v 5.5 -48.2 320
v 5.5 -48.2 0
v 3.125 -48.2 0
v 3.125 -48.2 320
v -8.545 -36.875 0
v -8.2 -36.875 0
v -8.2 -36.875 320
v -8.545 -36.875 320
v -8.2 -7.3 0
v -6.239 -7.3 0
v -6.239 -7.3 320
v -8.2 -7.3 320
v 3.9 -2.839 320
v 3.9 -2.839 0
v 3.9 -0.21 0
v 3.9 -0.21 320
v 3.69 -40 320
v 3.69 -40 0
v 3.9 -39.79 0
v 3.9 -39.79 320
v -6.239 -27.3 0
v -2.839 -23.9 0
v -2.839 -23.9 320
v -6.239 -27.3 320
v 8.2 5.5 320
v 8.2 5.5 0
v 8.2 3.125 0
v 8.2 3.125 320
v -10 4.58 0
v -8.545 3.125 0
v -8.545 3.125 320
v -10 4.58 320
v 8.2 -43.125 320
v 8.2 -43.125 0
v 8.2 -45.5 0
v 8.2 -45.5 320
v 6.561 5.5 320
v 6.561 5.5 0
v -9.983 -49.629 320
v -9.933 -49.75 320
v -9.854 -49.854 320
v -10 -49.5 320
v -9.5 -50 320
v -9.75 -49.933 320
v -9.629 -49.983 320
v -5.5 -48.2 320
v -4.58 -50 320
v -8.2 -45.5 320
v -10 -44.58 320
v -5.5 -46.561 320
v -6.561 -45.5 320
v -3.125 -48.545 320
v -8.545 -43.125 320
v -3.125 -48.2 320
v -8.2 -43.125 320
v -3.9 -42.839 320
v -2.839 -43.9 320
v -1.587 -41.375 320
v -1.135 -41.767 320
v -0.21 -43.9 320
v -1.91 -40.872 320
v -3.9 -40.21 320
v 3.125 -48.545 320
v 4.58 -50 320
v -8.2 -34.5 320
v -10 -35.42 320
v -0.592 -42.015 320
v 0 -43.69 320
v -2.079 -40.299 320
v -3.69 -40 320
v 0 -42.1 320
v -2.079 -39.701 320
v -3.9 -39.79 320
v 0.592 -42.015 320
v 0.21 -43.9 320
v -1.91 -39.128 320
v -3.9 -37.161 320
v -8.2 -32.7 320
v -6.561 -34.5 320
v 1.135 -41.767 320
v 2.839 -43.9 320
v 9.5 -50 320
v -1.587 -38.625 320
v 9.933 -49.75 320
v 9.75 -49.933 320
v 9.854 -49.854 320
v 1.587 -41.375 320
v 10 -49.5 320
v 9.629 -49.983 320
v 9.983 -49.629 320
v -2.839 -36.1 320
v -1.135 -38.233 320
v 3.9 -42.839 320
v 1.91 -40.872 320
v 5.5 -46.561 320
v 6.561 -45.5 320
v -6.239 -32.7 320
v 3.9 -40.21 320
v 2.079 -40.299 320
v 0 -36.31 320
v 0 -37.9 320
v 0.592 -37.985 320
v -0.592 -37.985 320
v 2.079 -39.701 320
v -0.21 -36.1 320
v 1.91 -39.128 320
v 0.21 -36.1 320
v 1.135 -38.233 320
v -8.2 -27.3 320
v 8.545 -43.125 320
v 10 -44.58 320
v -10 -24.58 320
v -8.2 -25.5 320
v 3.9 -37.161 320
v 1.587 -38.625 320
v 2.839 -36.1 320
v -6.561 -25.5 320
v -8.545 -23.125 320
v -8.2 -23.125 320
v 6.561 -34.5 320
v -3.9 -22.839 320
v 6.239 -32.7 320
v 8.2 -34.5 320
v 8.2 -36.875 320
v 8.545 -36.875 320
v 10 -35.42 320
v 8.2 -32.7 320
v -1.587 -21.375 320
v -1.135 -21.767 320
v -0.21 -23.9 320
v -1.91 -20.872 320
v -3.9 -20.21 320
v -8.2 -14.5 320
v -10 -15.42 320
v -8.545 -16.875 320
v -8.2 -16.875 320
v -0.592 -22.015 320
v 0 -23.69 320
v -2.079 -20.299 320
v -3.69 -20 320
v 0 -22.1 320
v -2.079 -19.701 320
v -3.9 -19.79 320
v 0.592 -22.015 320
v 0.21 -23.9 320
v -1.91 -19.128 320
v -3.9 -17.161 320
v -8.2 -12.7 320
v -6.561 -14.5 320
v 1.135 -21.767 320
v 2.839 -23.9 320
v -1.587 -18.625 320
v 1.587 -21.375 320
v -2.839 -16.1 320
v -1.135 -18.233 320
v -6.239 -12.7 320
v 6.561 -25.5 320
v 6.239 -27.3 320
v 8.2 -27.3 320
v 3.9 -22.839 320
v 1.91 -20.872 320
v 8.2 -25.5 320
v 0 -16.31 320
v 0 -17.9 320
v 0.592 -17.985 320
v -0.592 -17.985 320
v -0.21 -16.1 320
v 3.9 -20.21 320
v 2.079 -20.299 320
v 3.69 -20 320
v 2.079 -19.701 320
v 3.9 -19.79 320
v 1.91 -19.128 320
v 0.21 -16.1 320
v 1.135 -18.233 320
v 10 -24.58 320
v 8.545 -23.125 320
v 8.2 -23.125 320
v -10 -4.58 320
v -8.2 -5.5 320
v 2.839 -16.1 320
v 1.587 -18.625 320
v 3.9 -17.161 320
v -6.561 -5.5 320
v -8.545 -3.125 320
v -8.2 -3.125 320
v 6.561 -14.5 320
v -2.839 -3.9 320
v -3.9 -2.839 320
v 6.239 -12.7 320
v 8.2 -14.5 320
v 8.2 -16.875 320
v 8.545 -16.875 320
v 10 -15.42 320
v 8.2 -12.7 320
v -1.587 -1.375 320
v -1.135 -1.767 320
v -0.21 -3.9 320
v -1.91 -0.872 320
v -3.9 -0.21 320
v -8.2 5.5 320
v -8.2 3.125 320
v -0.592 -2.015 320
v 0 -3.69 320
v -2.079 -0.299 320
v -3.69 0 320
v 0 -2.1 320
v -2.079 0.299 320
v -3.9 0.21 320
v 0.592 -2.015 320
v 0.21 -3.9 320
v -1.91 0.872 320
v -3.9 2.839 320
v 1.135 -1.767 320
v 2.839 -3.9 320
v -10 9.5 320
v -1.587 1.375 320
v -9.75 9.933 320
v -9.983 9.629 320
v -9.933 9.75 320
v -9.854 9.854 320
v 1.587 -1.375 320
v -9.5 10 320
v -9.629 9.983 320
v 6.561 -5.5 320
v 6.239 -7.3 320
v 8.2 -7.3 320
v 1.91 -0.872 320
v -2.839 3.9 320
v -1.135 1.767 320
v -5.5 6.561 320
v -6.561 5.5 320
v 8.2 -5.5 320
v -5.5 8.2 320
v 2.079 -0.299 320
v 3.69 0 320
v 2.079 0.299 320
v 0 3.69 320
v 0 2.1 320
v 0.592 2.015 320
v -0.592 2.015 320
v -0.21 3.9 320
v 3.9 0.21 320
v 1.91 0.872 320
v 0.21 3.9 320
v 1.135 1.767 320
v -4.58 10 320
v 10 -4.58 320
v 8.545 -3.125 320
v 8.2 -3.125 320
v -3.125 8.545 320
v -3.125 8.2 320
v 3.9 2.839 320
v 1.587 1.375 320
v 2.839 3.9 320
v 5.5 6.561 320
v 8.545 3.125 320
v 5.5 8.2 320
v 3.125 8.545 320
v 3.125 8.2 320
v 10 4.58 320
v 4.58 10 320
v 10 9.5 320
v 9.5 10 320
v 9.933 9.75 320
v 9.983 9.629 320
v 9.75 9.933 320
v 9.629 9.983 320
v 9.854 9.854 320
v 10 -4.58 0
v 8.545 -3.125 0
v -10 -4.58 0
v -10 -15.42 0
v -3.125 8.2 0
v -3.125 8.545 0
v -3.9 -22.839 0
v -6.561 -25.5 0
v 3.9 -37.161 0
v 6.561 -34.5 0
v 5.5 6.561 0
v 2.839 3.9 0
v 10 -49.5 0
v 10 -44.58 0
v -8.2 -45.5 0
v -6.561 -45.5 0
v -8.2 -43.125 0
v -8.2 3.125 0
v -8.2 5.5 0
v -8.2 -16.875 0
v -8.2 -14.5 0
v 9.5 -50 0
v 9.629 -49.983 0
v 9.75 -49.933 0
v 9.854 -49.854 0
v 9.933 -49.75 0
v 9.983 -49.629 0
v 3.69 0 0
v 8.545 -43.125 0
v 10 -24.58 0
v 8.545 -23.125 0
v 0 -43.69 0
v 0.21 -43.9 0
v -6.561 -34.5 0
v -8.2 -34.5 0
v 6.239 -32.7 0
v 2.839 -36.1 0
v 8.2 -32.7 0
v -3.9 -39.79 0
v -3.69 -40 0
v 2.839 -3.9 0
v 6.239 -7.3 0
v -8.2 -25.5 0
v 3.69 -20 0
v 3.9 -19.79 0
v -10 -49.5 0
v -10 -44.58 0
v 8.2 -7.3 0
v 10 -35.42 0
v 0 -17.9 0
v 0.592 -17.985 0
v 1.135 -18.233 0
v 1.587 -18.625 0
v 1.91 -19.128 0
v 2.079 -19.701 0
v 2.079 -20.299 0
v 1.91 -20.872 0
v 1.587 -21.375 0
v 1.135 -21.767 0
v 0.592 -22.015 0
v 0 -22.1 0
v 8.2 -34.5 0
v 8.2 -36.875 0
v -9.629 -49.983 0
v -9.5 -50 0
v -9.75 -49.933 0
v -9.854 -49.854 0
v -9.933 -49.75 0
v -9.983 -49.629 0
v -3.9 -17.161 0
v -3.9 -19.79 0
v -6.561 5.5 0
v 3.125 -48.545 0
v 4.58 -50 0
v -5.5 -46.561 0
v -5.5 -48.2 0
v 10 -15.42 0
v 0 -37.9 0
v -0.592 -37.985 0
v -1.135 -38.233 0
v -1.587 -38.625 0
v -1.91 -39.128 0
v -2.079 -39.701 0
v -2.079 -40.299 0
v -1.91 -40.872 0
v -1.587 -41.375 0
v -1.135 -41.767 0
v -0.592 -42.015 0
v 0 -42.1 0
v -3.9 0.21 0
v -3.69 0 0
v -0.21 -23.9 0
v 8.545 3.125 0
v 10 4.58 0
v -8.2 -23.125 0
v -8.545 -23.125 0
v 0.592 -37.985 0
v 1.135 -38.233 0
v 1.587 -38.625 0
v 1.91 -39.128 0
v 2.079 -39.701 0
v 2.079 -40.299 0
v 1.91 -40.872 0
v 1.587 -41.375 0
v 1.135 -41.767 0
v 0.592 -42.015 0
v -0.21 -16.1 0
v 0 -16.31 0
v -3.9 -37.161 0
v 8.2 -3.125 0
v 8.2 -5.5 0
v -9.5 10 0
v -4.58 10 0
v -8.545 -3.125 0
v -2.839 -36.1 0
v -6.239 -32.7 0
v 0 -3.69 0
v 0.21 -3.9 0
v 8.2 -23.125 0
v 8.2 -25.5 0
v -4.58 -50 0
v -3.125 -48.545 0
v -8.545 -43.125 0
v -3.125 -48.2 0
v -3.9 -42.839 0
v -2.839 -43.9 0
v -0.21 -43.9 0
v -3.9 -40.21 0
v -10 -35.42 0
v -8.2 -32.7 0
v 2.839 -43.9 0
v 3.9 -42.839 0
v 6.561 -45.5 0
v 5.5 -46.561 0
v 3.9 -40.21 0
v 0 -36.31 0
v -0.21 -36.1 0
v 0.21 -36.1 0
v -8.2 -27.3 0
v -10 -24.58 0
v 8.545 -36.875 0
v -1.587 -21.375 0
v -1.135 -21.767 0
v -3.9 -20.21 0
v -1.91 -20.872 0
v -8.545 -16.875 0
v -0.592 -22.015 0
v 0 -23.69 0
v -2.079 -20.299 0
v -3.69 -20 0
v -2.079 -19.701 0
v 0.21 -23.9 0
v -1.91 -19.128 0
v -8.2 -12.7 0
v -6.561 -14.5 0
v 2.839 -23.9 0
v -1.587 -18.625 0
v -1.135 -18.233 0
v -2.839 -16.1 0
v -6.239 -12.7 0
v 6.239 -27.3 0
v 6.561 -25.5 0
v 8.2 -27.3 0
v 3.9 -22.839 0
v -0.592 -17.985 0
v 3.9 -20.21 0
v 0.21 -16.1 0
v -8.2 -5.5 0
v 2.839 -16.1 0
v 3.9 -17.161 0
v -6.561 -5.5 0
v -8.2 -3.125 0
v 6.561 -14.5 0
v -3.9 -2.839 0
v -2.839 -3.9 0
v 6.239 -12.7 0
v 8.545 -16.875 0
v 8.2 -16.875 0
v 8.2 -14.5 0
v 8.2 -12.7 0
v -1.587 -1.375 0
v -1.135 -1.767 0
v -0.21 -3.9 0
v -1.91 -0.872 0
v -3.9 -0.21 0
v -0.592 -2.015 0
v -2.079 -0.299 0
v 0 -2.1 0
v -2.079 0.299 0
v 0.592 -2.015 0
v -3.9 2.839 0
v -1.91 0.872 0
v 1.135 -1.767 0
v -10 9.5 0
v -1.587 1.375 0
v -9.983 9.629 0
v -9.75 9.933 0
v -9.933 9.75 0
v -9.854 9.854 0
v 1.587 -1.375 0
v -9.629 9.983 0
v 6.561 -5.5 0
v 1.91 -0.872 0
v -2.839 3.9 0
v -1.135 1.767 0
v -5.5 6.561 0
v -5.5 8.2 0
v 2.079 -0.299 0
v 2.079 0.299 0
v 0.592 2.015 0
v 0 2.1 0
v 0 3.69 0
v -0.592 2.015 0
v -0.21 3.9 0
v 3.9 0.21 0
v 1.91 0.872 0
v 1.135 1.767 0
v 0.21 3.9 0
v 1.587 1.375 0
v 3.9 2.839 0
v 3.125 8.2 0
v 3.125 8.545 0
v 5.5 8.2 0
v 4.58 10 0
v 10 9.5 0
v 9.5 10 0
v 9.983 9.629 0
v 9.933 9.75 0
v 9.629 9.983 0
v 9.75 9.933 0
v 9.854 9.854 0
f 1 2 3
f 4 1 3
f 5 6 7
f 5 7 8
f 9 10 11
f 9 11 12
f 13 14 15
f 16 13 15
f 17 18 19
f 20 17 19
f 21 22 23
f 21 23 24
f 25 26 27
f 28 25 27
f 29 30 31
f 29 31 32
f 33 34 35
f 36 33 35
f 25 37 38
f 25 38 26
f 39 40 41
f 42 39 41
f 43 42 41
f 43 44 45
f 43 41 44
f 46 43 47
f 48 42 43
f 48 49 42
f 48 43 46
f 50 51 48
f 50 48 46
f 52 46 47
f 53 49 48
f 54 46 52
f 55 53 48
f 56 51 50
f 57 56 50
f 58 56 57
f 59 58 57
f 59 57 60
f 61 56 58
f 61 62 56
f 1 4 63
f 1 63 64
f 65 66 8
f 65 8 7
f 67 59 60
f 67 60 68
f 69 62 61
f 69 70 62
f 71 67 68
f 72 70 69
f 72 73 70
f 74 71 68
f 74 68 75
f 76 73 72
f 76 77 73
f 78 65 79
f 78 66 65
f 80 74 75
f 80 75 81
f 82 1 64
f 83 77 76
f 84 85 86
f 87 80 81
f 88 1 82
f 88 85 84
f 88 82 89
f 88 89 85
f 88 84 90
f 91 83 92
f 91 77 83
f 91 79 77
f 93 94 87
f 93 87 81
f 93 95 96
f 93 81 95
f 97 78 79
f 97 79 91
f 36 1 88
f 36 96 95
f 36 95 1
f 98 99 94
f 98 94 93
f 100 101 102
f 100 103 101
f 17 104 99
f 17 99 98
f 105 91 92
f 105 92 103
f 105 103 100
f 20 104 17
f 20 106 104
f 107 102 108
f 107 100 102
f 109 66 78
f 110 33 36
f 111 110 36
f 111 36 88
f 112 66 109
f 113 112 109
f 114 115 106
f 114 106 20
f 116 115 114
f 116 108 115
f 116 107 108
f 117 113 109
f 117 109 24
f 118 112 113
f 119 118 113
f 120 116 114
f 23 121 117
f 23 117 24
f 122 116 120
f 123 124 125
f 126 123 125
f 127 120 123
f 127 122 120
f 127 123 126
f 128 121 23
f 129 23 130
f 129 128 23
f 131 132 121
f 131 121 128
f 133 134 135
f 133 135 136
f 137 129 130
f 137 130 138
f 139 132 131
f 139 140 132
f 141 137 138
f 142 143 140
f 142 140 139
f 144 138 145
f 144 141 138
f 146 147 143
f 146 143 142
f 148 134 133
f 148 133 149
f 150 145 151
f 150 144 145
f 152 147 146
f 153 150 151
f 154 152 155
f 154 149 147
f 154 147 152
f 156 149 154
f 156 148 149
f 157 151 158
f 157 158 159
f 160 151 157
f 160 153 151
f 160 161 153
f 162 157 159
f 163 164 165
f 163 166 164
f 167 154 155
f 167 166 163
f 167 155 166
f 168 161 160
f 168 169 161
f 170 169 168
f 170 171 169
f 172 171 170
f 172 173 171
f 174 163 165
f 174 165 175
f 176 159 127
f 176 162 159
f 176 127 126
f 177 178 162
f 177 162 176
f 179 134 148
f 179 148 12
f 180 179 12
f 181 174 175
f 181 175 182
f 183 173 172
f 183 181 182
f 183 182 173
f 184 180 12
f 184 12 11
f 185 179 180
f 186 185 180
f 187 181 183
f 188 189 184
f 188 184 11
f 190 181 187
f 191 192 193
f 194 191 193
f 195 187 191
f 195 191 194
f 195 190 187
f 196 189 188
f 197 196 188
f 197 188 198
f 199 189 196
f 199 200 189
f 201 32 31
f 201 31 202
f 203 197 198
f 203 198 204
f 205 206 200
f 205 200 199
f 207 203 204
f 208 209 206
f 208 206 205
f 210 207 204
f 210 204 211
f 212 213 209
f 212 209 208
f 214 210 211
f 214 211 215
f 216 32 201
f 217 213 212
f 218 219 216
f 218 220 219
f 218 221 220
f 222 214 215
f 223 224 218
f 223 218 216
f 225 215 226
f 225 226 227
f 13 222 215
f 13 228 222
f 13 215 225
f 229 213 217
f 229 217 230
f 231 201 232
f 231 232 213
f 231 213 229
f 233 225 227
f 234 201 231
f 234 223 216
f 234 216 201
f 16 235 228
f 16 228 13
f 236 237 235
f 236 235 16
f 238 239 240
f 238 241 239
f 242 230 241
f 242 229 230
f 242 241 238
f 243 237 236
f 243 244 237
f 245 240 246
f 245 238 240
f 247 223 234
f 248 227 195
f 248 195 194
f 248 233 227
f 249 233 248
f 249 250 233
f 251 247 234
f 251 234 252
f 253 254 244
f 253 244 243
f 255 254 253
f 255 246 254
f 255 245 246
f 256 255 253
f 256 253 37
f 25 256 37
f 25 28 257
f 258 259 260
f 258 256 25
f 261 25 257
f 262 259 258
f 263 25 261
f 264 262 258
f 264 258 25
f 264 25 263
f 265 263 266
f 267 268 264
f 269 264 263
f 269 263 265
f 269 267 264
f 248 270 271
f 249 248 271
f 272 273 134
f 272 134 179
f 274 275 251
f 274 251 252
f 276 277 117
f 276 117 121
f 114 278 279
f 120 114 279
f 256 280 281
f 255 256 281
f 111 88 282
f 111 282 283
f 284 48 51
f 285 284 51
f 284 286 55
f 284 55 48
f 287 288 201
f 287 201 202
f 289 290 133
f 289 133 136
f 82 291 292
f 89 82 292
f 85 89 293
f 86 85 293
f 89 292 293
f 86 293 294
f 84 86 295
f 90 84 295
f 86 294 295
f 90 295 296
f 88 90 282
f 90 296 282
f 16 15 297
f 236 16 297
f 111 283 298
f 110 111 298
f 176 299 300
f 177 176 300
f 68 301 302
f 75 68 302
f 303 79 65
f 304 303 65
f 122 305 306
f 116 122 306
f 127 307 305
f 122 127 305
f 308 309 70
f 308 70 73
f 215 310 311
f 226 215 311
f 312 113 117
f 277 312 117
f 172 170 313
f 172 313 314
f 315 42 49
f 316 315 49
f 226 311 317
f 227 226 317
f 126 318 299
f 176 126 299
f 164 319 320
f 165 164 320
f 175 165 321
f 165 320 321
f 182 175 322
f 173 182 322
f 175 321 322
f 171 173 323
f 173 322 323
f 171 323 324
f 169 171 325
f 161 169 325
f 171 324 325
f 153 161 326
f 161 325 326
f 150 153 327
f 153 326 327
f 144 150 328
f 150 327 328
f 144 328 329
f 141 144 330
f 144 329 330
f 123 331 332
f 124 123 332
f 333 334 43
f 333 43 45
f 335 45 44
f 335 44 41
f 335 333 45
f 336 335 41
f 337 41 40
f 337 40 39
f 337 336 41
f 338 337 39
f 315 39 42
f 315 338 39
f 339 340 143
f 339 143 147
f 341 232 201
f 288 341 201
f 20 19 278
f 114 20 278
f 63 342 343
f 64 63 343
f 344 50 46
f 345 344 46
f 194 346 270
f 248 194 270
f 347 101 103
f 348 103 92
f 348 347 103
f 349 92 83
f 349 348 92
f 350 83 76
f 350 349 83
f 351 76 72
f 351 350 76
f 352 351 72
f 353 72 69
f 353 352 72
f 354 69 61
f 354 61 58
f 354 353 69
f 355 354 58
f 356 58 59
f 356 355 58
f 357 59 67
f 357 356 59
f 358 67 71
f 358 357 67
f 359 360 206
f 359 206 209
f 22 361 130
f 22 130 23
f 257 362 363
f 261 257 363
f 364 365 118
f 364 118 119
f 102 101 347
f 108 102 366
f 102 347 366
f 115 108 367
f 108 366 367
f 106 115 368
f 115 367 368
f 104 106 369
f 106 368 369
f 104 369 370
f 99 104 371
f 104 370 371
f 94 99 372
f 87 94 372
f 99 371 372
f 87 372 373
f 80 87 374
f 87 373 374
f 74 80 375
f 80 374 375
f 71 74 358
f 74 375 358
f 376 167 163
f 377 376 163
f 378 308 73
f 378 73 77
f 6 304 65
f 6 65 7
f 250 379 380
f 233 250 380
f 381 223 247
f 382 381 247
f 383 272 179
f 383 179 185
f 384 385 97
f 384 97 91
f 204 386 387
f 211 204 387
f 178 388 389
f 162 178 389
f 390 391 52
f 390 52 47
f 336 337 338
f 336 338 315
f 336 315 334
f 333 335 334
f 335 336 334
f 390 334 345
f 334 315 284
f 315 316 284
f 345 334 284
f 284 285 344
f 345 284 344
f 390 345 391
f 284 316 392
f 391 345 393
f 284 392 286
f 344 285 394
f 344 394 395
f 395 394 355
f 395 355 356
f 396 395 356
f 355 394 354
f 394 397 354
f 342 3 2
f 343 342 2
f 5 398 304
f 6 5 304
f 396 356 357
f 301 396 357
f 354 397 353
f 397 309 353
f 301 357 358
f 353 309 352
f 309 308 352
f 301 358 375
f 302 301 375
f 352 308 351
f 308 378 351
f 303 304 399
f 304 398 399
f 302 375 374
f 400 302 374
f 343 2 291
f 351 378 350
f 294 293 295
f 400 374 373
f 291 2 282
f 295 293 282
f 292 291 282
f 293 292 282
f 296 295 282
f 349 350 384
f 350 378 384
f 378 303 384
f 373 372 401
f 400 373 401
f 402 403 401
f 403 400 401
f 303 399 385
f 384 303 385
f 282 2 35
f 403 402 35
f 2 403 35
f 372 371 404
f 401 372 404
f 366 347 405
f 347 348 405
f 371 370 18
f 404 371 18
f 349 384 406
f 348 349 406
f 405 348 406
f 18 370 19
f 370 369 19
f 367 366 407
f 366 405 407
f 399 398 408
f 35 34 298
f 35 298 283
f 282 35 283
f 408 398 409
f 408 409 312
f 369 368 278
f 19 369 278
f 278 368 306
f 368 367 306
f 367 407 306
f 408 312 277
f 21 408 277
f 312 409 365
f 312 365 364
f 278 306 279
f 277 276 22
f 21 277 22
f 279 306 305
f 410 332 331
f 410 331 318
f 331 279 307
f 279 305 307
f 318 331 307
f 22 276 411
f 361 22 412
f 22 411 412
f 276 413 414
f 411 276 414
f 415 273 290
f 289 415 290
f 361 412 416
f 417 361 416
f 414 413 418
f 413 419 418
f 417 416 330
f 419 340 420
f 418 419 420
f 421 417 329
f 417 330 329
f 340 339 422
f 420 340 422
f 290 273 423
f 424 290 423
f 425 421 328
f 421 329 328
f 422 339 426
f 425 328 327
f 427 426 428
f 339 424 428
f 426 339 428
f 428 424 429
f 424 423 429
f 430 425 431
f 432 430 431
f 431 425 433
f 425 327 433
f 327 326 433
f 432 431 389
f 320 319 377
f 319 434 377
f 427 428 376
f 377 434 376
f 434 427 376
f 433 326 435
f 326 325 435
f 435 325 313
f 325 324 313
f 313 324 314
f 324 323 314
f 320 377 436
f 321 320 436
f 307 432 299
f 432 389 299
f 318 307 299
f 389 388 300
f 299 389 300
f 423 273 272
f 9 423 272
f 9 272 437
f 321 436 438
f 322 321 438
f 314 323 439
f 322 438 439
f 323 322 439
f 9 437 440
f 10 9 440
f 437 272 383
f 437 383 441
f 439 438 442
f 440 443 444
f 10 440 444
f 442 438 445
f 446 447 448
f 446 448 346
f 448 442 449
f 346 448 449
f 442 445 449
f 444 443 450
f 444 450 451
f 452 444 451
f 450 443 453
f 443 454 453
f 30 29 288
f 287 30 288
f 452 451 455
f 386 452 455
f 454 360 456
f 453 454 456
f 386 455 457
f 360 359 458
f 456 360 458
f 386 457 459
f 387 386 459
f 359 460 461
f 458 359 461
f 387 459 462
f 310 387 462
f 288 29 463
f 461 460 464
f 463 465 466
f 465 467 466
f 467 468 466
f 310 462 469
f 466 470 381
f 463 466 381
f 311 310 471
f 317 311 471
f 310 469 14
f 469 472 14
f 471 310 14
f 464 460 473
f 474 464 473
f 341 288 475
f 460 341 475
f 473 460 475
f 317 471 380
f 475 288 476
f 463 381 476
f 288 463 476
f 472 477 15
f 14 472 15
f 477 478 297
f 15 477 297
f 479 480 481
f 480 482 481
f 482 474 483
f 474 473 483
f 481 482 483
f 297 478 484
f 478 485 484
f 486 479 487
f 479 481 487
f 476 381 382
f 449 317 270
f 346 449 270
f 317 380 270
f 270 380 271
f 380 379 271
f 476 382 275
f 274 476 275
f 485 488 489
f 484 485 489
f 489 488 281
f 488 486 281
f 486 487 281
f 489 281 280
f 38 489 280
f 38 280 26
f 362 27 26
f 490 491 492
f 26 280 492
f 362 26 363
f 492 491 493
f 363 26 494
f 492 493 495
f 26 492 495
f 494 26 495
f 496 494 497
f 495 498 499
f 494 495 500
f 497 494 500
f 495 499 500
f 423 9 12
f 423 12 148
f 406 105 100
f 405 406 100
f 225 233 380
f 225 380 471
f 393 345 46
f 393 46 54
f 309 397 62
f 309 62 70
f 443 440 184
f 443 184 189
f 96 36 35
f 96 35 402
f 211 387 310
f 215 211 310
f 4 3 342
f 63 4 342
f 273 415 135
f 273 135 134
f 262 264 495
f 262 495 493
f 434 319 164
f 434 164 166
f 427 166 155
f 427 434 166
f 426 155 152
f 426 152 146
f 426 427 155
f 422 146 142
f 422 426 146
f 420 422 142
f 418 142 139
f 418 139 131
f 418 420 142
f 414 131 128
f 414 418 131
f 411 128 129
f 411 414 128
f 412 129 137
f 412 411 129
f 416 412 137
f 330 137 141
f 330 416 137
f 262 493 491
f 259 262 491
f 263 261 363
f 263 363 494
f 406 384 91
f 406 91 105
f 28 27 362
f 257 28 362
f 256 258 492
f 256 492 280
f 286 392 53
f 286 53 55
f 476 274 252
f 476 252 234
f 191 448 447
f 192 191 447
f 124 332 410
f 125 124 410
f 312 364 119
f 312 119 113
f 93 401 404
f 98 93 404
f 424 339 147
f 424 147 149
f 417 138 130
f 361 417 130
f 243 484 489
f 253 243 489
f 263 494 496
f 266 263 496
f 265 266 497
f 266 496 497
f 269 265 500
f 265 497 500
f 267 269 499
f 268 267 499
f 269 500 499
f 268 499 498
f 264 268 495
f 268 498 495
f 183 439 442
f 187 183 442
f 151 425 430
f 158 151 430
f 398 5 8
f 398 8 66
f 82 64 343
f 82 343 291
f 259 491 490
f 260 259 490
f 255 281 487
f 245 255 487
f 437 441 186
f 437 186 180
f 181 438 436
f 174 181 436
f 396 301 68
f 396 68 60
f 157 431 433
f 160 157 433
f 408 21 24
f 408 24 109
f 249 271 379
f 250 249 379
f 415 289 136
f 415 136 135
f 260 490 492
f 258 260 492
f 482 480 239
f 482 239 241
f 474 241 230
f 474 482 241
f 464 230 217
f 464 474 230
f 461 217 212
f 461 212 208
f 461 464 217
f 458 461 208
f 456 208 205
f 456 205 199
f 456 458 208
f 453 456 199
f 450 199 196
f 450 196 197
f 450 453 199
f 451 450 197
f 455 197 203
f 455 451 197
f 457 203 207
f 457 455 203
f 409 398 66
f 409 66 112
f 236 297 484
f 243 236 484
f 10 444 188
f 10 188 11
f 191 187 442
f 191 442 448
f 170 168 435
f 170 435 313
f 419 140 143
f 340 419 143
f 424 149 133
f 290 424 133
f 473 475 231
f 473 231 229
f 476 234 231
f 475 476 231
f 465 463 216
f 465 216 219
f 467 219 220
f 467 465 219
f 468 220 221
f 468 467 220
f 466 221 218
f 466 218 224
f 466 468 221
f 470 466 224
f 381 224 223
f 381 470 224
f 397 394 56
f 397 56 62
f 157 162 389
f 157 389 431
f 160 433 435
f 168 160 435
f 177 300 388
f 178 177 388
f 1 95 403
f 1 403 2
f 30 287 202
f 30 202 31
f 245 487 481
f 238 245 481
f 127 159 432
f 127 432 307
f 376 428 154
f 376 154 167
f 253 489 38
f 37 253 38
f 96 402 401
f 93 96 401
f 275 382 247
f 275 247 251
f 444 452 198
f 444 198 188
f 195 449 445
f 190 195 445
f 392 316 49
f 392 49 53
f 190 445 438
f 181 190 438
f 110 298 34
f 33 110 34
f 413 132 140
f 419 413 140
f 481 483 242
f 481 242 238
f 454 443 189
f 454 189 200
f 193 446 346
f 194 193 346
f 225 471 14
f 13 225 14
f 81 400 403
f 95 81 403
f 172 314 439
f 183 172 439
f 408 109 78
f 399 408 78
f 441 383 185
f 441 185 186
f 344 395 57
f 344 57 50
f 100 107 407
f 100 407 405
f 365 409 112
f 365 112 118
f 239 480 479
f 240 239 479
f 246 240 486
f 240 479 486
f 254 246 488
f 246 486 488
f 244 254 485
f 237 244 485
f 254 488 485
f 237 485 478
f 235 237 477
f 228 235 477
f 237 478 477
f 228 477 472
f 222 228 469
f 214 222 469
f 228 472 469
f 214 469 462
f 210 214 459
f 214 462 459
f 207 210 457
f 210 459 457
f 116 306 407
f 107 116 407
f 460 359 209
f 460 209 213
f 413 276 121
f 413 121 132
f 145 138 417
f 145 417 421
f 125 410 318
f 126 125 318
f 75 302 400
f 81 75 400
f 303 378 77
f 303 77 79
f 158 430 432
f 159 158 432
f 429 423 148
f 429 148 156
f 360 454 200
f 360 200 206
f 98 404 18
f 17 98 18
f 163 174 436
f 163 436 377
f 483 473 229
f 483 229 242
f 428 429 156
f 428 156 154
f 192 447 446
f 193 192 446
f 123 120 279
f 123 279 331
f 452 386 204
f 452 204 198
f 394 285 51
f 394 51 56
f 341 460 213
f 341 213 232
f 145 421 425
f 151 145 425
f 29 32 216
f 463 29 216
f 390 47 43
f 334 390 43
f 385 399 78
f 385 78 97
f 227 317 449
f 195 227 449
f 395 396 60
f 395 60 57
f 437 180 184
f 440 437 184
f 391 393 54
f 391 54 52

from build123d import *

# Parameters (mm, degrees)
BOSS_EXTRU_1_DEPTH = 320


with BuildPart() as part:
    # Esquisse1 → Boss.-Extru.1 (new body)
    with BuildSketch(Plane.XY):
        with BuildLine():
            Line((-9.5, 10), (-4.58, 10))
            Line((-4.58, 10), (-3.125, 8.545))
            Line((-3.125, 8.545), (-3.125, 8.2))
            Line((-3.125, 8.2), (-5.5, 8.2))
            Line((-5.5, 8.2), (-5.5, 6.560660172))
            Line((-5.5, 6.560660172), (-2.839339828, 3.9))
            Line((-2.839339828, 3.9), (-0.21, 3.9))
            Line((-0.21, 3.9), (0, 3.69))
            Line((0, 3.69), (0, 2.1))
            ThreePointArc((0, 2.1), (-2.1, 0), (0, -2.1))
            Line((0, -2.1), (0, -3.69))
            Line((0, -3.69), (-0.21, -3.9))
            Line((-0.21, -3.9), (-2.839339828, -3.9))
            Line((-2.839339828, -3.9), (-6.239339828, -7.3))
            Line((-6.239339828, -7.3), (-8.2, -7.3))
            Line((-8.2, -7.3), (-8.2, -12.7))
            Line((-8.2, -12.7), (-6.239339828, -12.7))
            Line((-6.239339828, -12.7), (-2.839339828, -16.1))
            Line((-2.839339828, -16.1), (-0.21, -16.1))
            Line((-0.21, -16.1), (0, -16.31))
            Line((0, -16.31), (0, -17.9))
            ThreePointArc((0, -17.9), (-2.1, -20), (0, -22.1))
            Line((0, -22.1), (0, -23.69))
            Line((0, -23.69), (-0.21, -23.9))
            Line((-0.21, -23.9), (-2.839339828, -23.9))
            Line((-2.839339828, -23.9), (-6.239339828, -27.3))
            Line((-6.239339828, -27.3), (-8.2, -27.3))
            Line((-8.2, -27.3), (-8.2, -32.7))
            Line((-8.2, -32.7), (-6.239339828, -32.7))
            Line((-6.239339828, -32.7), (-2.839339828, -36.1))
            Line((-2.839339828, -36.1), (-0.21, -36.1))
            Line((-0.21, -36.1), (0, -36.31))
            Line((0, -36.31), (0, -37.9))
            ThreePointArc((0, -37.9), (-2.1, -40), (0, -42.1))
            Line((0, -42.1), (0, -43.69))
            Line((0, -43.69), (-0.21, -43.9))
            Line((-0.21, -43.9), (-2.839339828, -43.9))
            Line((-2.839339828, -43.9), (-5.5, -46.560660172))
            Line((-5.5, -46.560660172), (-5.5, -48.2))
            Line((-5.5, -48.2), (-3.125, -48.2))
            Line((-3.125, -48.2), (-3.125, -48.545))
            Line((-3.125, -48.545), (-4.58, -50))
            Line((-4.58, -50), (-9.5, -50))
            ThreePointArc((-9.5, -50), (-9.853553391, -49.853553391), (-10, -49.5))
            Line((-10, -49.5), (-10, -44.58))
            Line((-10, -44.58), (-8.545, -43.125))
            Line((-8.545, -43.125), (-8.2, -43.125))
            Line((-8.2, -43.125), (-8.2, -45.5))
            Line((-8.2, -45.5), (-6.560660172, -45.5))
            Line((-6.560660172, -45.5), (-3.9, -42.839339828))
            Line((-3.9, -42.839339828), (-3.9, -40.21))
            Line((-3.9, -40.21), (-3.69, -40))
            Line((-3.69, -40), (-3.9, -39.79))
            Line((-3.9, -39.79), (-3.9, -37.160660172))
            Line((-3.9, -37.160660172), (-6.560660172, -34.5))
            Line((-6.560660172, -34.5), (-8.2, -34.5))
            Line((-8.2, -34.5), (-8.2, -36.875))
            Line((-8.2, -36.875), (-8.545, -36.875))
            Line((-8.545, -36.875), (-10, -35.42))
            Line((-10, -35.42), (-10, -24.58))
            Line((-10, -24.58), (-8.545, -23.125))
            Line((-8.545, -23.125), (-8.2, -23.125))
            Line((-8.2, -23.125), (-8.2, -25.5))
            Line((-8.2, -25.5), (-6.560660172, -25.5))
            Line((-6.560660172, -25.5), (-3.9, -22.839339828))
            Line((-3.9, -22.839339828), (-3.9, -20.21))
            Line((-3.9, -20.21), (-3.69, -20))
            Line((-3.69, -20), (-3.9, -19.79))
            Line((-3.9, -19.79), (-3.9, -17.160660172))
            Line((-3.9, -17.160660172), (-6.560660172, -14.5))
            Line((-6.560660172, -14.5), (-8.2, -14.5))
            Line((-8.2, -14.5), (-8.2, -16.875))
            Line((-8.2, -16.875), (-8.545, -16.875))
            Line((-8.545, -16.875), (-10, -15.42))
            Line((-10, -15.42), (-10, -4.58))
            Line((-10, -4.58), (-8.545, -3.125))
            Line((-8.545, -3.125), (-8.2, -3.125))
            Line((-8.2, -3.125), (-8.2, -5.5))
            Line((-8.2, -5.5), (-6.560660172, -5.5))
            Line((-6.560660172, -5.5), (-3.9, -2.839339828))
            Line((-3.9, -2.839339828), (-3.9, -0.21))
            Line((-3.9, -0.21), (-3.69, 0))
            Line((-3.69, 0), (-3.9, 0.21))
            Line((-3.9, 0.21), (-3.9, 2.839339828))
            Line((-3.9, 2.839339828), (-6.560660172, 5.5))
            Line((-6.560660172, 5.5), (-8.2, 5.5))
            Line((-8.2, 5.5), (-8.2, 3.125))
            Line((-8.2, 3.125), (-8.545, 3.125))
            Line((-8.545, 3.125), (-10, 4.58))
            Line((-10, 4.58), (-10, 9.5))
            ThreePointArc((-10, 9.5), (-9.853553391, 9.853553391), (-9.5, 10))
        make_face()
    boss_extru_1 = extrude(amount=BOSS_EXTRU_1_DEPTH)

    # Symétrie1: Boss.-Extru.1 across plane
    add(boss_extru_1.mirror(Plane(origin=(0, 3.69, 320), x_dir=(0, 0, 1), z_dir=(-1, 0, 0))))


solid = part.part
